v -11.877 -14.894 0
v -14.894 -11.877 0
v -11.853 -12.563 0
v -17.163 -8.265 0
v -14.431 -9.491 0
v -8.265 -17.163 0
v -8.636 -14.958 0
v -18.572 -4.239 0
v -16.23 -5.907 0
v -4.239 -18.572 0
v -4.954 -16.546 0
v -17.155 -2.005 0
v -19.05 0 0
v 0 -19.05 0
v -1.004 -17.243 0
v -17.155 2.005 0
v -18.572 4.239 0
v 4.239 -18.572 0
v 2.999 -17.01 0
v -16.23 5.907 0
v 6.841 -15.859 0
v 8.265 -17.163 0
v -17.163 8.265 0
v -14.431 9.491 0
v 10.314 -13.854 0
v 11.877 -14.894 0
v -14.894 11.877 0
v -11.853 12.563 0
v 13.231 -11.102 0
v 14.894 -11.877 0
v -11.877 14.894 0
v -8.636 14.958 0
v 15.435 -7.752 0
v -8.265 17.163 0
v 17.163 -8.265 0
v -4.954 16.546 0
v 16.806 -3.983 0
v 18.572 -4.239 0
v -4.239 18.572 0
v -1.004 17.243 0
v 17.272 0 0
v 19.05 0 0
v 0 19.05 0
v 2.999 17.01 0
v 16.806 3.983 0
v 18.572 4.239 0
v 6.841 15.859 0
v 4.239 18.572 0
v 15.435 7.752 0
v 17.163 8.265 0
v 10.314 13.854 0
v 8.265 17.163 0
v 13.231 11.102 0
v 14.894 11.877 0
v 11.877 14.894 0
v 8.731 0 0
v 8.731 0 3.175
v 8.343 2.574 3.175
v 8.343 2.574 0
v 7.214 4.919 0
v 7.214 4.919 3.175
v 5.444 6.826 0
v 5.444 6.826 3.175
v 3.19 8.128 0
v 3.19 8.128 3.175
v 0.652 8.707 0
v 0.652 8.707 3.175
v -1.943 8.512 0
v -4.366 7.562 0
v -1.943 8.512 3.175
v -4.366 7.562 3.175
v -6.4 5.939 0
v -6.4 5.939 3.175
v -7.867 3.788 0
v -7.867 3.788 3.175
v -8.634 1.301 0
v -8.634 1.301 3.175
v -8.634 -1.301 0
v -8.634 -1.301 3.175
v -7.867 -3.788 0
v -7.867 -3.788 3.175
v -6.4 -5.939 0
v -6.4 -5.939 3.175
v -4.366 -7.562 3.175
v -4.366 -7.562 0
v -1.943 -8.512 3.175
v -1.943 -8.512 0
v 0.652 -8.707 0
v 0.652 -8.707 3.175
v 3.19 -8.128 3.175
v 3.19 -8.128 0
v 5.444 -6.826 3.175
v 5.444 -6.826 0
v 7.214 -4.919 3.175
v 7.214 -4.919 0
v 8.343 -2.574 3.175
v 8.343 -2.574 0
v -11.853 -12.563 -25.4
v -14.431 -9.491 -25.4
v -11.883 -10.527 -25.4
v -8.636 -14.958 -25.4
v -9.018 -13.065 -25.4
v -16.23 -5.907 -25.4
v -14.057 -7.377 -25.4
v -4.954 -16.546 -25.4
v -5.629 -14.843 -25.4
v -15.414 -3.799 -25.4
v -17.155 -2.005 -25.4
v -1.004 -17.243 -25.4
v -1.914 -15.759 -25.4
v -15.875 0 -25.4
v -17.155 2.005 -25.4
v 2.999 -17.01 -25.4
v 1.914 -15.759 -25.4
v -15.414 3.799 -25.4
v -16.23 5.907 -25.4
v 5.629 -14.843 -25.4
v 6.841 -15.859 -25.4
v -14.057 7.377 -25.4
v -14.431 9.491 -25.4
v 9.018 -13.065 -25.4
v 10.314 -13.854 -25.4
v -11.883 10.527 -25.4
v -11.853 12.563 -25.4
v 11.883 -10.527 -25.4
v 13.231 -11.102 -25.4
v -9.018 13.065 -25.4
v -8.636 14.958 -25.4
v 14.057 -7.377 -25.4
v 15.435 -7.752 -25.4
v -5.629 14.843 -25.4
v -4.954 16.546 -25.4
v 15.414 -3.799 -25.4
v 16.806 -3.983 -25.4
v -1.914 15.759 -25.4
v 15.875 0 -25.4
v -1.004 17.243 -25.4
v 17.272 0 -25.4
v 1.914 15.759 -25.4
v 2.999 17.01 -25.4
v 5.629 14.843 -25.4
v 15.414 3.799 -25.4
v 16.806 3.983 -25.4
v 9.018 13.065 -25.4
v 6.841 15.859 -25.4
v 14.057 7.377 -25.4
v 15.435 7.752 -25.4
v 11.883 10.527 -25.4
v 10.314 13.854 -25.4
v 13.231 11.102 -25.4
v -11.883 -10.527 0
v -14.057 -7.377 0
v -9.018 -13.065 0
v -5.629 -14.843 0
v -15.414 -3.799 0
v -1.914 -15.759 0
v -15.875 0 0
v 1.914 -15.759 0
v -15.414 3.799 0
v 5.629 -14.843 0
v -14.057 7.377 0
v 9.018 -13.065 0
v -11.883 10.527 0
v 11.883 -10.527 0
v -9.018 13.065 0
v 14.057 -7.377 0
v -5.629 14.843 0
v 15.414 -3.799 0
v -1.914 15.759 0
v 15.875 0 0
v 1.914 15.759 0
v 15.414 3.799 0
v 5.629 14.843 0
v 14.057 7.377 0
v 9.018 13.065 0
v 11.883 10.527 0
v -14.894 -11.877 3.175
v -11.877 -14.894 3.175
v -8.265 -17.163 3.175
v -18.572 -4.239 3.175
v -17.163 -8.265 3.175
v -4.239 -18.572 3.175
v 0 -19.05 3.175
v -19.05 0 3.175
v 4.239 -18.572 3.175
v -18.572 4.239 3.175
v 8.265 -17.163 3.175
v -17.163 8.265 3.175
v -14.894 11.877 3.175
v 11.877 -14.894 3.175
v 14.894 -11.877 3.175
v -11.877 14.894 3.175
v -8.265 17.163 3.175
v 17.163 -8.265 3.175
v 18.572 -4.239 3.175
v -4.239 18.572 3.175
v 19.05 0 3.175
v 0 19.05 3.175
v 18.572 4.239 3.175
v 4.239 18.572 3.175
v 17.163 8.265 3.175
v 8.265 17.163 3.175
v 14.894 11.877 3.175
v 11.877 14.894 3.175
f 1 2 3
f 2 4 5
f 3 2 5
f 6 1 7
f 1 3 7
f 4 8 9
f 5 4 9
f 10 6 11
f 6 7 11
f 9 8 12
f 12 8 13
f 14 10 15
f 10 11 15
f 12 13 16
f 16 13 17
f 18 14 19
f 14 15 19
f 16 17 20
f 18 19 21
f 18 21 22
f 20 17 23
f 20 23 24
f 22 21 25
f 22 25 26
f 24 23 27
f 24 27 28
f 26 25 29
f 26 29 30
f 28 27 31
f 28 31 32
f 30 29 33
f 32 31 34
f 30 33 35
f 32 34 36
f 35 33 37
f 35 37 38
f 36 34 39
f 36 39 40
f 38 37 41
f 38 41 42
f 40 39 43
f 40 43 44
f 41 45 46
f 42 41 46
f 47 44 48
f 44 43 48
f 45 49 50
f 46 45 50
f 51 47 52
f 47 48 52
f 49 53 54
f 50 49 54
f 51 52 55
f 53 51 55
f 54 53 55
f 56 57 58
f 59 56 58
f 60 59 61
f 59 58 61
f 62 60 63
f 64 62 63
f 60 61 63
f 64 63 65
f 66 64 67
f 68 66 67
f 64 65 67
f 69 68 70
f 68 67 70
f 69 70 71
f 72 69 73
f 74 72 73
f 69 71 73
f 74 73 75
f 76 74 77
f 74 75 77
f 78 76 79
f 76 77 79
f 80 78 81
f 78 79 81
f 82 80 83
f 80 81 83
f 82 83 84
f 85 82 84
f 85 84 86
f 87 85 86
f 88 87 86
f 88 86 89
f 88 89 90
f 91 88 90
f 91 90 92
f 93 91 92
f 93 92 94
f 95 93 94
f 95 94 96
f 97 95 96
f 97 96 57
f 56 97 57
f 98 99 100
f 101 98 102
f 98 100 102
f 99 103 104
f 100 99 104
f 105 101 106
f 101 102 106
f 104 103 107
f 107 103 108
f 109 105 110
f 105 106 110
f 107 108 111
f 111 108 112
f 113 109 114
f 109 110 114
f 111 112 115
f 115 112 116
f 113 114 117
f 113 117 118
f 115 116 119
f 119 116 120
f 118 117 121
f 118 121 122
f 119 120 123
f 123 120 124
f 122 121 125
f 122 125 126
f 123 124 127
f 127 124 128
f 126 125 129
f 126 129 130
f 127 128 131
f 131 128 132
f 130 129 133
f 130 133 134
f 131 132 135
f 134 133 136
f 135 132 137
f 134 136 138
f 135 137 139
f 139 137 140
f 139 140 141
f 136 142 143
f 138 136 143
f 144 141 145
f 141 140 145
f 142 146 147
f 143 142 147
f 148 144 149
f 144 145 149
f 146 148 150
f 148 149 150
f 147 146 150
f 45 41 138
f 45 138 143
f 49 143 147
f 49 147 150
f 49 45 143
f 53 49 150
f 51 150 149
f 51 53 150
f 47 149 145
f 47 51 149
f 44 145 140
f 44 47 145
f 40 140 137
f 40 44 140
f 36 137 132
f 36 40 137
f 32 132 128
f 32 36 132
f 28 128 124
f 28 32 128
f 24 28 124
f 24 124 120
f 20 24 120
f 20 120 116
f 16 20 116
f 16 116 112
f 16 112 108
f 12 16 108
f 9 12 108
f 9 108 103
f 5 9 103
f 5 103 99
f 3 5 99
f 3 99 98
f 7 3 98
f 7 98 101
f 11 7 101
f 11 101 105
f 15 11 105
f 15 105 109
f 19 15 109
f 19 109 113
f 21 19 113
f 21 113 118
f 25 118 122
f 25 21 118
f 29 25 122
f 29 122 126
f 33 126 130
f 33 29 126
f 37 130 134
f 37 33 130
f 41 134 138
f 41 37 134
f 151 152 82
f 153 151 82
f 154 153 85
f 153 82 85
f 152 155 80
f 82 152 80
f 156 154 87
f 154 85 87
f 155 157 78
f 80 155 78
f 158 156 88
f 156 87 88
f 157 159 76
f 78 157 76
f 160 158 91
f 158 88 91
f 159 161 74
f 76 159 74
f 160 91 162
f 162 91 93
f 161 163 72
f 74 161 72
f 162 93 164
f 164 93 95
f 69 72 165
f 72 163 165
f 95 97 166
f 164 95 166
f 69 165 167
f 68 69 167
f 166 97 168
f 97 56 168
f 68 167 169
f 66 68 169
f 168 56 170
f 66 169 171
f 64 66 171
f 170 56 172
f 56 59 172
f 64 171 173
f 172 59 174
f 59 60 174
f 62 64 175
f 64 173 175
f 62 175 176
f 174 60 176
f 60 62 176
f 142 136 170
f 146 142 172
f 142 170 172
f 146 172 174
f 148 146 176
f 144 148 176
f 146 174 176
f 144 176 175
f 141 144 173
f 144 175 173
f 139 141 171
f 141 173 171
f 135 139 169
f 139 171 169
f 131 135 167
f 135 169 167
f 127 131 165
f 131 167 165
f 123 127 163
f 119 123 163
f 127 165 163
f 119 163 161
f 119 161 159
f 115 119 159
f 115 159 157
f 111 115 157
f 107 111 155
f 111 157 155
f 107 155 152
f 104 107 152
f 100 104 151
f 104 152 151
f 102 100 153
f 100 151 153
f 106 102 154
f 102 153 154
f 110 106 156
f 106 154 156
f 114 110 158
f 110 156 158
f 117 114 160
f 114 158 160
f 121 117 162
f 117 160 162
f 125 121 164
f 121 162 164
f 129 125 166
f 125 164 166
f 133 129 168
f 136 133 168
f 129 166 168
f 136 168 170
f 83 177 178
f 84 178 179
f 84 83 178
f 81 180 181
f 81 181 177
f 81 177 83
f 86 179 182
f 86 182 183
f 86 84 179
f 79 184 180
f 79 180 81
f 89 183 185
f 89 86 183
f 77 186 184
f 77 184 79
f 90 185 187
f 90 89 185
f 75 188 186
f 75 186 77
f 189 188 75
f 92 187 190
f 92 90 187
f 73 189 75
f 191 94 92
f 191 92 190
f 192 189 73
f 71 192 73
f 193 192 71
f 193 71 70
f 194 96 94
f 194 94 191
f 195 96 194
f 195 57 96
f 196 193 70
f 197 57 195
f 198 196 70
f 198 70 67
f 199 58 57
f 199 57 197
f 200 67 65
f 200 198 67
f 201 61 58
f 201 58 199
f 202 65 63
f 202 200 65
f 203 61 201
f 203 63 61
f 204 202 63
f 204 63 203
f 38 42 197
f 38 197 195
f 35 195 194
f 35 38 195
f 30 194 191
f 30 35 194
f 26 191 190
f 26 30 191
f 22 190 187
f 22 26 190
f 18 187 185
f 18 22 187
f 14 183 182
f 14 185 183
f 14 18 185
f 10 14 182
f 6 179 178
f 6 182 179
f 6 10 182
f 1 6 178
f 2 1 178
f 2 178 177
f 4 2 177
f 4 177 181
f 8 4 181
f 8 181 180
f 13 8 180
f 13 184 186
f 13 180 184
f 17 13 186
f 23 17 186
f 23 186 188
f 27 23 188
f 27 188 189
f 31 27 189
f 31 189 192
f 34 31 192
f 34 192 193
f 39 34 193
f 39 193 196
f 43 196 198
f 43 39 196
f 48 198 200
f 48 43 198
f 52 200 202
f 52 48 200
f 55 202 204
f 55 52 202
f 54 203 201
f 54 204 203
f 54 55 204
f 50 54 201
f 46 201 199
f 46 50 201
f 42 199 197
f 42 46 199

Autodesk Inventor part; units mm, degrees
ref_plane "YZ Plane" through (0, 0, 0) normal (1, 0, 0) x (0, 1, 0)
ref_plane "XZ Plane" through (0, 0, 0) normal (0, 1, 0) x (-1, 0, 0)
ref_plane "XY Plane" through (0, 0, 0) normal (0, 0, 1) x (1, 0, 0)
sketch "Sketch1" plane through (0, 0, 0) normal (0, 0, 1) x (1, 0, 0)
  circle A0 centre (0, 0) radius 17.272
  circle A1 centre (0, 0) radius 19.05
  circle A2 centre (0, 0) radius 15.875
  dimension "d0" = 34.544
  dimension "d1" = 38.1
  dimension "d6" = 31.75
extrude "Extrusion1" add sketch "Sketch1" along normal blind 3.175 contours A0 | A1 | A2
extrude "Extrusion2" add sketch "Sketch1" against normal blind 25.4 contours A0
sketch "Sketch2" plane through (0, 0, 3.175) normal (0, 0, 1) x (1, 0, 0)
  circle A0 centre (0, 0) radius 19.05 projected
  circle A1 centre (0, 0) radius 8.7313
  dimension "d7" = 17.4625
extrude "Extrusion3" cut sketch "Sketch2" against normal blind 25.4 contours A1
properties part number "PVC Cap" material "PVC-Piping"
